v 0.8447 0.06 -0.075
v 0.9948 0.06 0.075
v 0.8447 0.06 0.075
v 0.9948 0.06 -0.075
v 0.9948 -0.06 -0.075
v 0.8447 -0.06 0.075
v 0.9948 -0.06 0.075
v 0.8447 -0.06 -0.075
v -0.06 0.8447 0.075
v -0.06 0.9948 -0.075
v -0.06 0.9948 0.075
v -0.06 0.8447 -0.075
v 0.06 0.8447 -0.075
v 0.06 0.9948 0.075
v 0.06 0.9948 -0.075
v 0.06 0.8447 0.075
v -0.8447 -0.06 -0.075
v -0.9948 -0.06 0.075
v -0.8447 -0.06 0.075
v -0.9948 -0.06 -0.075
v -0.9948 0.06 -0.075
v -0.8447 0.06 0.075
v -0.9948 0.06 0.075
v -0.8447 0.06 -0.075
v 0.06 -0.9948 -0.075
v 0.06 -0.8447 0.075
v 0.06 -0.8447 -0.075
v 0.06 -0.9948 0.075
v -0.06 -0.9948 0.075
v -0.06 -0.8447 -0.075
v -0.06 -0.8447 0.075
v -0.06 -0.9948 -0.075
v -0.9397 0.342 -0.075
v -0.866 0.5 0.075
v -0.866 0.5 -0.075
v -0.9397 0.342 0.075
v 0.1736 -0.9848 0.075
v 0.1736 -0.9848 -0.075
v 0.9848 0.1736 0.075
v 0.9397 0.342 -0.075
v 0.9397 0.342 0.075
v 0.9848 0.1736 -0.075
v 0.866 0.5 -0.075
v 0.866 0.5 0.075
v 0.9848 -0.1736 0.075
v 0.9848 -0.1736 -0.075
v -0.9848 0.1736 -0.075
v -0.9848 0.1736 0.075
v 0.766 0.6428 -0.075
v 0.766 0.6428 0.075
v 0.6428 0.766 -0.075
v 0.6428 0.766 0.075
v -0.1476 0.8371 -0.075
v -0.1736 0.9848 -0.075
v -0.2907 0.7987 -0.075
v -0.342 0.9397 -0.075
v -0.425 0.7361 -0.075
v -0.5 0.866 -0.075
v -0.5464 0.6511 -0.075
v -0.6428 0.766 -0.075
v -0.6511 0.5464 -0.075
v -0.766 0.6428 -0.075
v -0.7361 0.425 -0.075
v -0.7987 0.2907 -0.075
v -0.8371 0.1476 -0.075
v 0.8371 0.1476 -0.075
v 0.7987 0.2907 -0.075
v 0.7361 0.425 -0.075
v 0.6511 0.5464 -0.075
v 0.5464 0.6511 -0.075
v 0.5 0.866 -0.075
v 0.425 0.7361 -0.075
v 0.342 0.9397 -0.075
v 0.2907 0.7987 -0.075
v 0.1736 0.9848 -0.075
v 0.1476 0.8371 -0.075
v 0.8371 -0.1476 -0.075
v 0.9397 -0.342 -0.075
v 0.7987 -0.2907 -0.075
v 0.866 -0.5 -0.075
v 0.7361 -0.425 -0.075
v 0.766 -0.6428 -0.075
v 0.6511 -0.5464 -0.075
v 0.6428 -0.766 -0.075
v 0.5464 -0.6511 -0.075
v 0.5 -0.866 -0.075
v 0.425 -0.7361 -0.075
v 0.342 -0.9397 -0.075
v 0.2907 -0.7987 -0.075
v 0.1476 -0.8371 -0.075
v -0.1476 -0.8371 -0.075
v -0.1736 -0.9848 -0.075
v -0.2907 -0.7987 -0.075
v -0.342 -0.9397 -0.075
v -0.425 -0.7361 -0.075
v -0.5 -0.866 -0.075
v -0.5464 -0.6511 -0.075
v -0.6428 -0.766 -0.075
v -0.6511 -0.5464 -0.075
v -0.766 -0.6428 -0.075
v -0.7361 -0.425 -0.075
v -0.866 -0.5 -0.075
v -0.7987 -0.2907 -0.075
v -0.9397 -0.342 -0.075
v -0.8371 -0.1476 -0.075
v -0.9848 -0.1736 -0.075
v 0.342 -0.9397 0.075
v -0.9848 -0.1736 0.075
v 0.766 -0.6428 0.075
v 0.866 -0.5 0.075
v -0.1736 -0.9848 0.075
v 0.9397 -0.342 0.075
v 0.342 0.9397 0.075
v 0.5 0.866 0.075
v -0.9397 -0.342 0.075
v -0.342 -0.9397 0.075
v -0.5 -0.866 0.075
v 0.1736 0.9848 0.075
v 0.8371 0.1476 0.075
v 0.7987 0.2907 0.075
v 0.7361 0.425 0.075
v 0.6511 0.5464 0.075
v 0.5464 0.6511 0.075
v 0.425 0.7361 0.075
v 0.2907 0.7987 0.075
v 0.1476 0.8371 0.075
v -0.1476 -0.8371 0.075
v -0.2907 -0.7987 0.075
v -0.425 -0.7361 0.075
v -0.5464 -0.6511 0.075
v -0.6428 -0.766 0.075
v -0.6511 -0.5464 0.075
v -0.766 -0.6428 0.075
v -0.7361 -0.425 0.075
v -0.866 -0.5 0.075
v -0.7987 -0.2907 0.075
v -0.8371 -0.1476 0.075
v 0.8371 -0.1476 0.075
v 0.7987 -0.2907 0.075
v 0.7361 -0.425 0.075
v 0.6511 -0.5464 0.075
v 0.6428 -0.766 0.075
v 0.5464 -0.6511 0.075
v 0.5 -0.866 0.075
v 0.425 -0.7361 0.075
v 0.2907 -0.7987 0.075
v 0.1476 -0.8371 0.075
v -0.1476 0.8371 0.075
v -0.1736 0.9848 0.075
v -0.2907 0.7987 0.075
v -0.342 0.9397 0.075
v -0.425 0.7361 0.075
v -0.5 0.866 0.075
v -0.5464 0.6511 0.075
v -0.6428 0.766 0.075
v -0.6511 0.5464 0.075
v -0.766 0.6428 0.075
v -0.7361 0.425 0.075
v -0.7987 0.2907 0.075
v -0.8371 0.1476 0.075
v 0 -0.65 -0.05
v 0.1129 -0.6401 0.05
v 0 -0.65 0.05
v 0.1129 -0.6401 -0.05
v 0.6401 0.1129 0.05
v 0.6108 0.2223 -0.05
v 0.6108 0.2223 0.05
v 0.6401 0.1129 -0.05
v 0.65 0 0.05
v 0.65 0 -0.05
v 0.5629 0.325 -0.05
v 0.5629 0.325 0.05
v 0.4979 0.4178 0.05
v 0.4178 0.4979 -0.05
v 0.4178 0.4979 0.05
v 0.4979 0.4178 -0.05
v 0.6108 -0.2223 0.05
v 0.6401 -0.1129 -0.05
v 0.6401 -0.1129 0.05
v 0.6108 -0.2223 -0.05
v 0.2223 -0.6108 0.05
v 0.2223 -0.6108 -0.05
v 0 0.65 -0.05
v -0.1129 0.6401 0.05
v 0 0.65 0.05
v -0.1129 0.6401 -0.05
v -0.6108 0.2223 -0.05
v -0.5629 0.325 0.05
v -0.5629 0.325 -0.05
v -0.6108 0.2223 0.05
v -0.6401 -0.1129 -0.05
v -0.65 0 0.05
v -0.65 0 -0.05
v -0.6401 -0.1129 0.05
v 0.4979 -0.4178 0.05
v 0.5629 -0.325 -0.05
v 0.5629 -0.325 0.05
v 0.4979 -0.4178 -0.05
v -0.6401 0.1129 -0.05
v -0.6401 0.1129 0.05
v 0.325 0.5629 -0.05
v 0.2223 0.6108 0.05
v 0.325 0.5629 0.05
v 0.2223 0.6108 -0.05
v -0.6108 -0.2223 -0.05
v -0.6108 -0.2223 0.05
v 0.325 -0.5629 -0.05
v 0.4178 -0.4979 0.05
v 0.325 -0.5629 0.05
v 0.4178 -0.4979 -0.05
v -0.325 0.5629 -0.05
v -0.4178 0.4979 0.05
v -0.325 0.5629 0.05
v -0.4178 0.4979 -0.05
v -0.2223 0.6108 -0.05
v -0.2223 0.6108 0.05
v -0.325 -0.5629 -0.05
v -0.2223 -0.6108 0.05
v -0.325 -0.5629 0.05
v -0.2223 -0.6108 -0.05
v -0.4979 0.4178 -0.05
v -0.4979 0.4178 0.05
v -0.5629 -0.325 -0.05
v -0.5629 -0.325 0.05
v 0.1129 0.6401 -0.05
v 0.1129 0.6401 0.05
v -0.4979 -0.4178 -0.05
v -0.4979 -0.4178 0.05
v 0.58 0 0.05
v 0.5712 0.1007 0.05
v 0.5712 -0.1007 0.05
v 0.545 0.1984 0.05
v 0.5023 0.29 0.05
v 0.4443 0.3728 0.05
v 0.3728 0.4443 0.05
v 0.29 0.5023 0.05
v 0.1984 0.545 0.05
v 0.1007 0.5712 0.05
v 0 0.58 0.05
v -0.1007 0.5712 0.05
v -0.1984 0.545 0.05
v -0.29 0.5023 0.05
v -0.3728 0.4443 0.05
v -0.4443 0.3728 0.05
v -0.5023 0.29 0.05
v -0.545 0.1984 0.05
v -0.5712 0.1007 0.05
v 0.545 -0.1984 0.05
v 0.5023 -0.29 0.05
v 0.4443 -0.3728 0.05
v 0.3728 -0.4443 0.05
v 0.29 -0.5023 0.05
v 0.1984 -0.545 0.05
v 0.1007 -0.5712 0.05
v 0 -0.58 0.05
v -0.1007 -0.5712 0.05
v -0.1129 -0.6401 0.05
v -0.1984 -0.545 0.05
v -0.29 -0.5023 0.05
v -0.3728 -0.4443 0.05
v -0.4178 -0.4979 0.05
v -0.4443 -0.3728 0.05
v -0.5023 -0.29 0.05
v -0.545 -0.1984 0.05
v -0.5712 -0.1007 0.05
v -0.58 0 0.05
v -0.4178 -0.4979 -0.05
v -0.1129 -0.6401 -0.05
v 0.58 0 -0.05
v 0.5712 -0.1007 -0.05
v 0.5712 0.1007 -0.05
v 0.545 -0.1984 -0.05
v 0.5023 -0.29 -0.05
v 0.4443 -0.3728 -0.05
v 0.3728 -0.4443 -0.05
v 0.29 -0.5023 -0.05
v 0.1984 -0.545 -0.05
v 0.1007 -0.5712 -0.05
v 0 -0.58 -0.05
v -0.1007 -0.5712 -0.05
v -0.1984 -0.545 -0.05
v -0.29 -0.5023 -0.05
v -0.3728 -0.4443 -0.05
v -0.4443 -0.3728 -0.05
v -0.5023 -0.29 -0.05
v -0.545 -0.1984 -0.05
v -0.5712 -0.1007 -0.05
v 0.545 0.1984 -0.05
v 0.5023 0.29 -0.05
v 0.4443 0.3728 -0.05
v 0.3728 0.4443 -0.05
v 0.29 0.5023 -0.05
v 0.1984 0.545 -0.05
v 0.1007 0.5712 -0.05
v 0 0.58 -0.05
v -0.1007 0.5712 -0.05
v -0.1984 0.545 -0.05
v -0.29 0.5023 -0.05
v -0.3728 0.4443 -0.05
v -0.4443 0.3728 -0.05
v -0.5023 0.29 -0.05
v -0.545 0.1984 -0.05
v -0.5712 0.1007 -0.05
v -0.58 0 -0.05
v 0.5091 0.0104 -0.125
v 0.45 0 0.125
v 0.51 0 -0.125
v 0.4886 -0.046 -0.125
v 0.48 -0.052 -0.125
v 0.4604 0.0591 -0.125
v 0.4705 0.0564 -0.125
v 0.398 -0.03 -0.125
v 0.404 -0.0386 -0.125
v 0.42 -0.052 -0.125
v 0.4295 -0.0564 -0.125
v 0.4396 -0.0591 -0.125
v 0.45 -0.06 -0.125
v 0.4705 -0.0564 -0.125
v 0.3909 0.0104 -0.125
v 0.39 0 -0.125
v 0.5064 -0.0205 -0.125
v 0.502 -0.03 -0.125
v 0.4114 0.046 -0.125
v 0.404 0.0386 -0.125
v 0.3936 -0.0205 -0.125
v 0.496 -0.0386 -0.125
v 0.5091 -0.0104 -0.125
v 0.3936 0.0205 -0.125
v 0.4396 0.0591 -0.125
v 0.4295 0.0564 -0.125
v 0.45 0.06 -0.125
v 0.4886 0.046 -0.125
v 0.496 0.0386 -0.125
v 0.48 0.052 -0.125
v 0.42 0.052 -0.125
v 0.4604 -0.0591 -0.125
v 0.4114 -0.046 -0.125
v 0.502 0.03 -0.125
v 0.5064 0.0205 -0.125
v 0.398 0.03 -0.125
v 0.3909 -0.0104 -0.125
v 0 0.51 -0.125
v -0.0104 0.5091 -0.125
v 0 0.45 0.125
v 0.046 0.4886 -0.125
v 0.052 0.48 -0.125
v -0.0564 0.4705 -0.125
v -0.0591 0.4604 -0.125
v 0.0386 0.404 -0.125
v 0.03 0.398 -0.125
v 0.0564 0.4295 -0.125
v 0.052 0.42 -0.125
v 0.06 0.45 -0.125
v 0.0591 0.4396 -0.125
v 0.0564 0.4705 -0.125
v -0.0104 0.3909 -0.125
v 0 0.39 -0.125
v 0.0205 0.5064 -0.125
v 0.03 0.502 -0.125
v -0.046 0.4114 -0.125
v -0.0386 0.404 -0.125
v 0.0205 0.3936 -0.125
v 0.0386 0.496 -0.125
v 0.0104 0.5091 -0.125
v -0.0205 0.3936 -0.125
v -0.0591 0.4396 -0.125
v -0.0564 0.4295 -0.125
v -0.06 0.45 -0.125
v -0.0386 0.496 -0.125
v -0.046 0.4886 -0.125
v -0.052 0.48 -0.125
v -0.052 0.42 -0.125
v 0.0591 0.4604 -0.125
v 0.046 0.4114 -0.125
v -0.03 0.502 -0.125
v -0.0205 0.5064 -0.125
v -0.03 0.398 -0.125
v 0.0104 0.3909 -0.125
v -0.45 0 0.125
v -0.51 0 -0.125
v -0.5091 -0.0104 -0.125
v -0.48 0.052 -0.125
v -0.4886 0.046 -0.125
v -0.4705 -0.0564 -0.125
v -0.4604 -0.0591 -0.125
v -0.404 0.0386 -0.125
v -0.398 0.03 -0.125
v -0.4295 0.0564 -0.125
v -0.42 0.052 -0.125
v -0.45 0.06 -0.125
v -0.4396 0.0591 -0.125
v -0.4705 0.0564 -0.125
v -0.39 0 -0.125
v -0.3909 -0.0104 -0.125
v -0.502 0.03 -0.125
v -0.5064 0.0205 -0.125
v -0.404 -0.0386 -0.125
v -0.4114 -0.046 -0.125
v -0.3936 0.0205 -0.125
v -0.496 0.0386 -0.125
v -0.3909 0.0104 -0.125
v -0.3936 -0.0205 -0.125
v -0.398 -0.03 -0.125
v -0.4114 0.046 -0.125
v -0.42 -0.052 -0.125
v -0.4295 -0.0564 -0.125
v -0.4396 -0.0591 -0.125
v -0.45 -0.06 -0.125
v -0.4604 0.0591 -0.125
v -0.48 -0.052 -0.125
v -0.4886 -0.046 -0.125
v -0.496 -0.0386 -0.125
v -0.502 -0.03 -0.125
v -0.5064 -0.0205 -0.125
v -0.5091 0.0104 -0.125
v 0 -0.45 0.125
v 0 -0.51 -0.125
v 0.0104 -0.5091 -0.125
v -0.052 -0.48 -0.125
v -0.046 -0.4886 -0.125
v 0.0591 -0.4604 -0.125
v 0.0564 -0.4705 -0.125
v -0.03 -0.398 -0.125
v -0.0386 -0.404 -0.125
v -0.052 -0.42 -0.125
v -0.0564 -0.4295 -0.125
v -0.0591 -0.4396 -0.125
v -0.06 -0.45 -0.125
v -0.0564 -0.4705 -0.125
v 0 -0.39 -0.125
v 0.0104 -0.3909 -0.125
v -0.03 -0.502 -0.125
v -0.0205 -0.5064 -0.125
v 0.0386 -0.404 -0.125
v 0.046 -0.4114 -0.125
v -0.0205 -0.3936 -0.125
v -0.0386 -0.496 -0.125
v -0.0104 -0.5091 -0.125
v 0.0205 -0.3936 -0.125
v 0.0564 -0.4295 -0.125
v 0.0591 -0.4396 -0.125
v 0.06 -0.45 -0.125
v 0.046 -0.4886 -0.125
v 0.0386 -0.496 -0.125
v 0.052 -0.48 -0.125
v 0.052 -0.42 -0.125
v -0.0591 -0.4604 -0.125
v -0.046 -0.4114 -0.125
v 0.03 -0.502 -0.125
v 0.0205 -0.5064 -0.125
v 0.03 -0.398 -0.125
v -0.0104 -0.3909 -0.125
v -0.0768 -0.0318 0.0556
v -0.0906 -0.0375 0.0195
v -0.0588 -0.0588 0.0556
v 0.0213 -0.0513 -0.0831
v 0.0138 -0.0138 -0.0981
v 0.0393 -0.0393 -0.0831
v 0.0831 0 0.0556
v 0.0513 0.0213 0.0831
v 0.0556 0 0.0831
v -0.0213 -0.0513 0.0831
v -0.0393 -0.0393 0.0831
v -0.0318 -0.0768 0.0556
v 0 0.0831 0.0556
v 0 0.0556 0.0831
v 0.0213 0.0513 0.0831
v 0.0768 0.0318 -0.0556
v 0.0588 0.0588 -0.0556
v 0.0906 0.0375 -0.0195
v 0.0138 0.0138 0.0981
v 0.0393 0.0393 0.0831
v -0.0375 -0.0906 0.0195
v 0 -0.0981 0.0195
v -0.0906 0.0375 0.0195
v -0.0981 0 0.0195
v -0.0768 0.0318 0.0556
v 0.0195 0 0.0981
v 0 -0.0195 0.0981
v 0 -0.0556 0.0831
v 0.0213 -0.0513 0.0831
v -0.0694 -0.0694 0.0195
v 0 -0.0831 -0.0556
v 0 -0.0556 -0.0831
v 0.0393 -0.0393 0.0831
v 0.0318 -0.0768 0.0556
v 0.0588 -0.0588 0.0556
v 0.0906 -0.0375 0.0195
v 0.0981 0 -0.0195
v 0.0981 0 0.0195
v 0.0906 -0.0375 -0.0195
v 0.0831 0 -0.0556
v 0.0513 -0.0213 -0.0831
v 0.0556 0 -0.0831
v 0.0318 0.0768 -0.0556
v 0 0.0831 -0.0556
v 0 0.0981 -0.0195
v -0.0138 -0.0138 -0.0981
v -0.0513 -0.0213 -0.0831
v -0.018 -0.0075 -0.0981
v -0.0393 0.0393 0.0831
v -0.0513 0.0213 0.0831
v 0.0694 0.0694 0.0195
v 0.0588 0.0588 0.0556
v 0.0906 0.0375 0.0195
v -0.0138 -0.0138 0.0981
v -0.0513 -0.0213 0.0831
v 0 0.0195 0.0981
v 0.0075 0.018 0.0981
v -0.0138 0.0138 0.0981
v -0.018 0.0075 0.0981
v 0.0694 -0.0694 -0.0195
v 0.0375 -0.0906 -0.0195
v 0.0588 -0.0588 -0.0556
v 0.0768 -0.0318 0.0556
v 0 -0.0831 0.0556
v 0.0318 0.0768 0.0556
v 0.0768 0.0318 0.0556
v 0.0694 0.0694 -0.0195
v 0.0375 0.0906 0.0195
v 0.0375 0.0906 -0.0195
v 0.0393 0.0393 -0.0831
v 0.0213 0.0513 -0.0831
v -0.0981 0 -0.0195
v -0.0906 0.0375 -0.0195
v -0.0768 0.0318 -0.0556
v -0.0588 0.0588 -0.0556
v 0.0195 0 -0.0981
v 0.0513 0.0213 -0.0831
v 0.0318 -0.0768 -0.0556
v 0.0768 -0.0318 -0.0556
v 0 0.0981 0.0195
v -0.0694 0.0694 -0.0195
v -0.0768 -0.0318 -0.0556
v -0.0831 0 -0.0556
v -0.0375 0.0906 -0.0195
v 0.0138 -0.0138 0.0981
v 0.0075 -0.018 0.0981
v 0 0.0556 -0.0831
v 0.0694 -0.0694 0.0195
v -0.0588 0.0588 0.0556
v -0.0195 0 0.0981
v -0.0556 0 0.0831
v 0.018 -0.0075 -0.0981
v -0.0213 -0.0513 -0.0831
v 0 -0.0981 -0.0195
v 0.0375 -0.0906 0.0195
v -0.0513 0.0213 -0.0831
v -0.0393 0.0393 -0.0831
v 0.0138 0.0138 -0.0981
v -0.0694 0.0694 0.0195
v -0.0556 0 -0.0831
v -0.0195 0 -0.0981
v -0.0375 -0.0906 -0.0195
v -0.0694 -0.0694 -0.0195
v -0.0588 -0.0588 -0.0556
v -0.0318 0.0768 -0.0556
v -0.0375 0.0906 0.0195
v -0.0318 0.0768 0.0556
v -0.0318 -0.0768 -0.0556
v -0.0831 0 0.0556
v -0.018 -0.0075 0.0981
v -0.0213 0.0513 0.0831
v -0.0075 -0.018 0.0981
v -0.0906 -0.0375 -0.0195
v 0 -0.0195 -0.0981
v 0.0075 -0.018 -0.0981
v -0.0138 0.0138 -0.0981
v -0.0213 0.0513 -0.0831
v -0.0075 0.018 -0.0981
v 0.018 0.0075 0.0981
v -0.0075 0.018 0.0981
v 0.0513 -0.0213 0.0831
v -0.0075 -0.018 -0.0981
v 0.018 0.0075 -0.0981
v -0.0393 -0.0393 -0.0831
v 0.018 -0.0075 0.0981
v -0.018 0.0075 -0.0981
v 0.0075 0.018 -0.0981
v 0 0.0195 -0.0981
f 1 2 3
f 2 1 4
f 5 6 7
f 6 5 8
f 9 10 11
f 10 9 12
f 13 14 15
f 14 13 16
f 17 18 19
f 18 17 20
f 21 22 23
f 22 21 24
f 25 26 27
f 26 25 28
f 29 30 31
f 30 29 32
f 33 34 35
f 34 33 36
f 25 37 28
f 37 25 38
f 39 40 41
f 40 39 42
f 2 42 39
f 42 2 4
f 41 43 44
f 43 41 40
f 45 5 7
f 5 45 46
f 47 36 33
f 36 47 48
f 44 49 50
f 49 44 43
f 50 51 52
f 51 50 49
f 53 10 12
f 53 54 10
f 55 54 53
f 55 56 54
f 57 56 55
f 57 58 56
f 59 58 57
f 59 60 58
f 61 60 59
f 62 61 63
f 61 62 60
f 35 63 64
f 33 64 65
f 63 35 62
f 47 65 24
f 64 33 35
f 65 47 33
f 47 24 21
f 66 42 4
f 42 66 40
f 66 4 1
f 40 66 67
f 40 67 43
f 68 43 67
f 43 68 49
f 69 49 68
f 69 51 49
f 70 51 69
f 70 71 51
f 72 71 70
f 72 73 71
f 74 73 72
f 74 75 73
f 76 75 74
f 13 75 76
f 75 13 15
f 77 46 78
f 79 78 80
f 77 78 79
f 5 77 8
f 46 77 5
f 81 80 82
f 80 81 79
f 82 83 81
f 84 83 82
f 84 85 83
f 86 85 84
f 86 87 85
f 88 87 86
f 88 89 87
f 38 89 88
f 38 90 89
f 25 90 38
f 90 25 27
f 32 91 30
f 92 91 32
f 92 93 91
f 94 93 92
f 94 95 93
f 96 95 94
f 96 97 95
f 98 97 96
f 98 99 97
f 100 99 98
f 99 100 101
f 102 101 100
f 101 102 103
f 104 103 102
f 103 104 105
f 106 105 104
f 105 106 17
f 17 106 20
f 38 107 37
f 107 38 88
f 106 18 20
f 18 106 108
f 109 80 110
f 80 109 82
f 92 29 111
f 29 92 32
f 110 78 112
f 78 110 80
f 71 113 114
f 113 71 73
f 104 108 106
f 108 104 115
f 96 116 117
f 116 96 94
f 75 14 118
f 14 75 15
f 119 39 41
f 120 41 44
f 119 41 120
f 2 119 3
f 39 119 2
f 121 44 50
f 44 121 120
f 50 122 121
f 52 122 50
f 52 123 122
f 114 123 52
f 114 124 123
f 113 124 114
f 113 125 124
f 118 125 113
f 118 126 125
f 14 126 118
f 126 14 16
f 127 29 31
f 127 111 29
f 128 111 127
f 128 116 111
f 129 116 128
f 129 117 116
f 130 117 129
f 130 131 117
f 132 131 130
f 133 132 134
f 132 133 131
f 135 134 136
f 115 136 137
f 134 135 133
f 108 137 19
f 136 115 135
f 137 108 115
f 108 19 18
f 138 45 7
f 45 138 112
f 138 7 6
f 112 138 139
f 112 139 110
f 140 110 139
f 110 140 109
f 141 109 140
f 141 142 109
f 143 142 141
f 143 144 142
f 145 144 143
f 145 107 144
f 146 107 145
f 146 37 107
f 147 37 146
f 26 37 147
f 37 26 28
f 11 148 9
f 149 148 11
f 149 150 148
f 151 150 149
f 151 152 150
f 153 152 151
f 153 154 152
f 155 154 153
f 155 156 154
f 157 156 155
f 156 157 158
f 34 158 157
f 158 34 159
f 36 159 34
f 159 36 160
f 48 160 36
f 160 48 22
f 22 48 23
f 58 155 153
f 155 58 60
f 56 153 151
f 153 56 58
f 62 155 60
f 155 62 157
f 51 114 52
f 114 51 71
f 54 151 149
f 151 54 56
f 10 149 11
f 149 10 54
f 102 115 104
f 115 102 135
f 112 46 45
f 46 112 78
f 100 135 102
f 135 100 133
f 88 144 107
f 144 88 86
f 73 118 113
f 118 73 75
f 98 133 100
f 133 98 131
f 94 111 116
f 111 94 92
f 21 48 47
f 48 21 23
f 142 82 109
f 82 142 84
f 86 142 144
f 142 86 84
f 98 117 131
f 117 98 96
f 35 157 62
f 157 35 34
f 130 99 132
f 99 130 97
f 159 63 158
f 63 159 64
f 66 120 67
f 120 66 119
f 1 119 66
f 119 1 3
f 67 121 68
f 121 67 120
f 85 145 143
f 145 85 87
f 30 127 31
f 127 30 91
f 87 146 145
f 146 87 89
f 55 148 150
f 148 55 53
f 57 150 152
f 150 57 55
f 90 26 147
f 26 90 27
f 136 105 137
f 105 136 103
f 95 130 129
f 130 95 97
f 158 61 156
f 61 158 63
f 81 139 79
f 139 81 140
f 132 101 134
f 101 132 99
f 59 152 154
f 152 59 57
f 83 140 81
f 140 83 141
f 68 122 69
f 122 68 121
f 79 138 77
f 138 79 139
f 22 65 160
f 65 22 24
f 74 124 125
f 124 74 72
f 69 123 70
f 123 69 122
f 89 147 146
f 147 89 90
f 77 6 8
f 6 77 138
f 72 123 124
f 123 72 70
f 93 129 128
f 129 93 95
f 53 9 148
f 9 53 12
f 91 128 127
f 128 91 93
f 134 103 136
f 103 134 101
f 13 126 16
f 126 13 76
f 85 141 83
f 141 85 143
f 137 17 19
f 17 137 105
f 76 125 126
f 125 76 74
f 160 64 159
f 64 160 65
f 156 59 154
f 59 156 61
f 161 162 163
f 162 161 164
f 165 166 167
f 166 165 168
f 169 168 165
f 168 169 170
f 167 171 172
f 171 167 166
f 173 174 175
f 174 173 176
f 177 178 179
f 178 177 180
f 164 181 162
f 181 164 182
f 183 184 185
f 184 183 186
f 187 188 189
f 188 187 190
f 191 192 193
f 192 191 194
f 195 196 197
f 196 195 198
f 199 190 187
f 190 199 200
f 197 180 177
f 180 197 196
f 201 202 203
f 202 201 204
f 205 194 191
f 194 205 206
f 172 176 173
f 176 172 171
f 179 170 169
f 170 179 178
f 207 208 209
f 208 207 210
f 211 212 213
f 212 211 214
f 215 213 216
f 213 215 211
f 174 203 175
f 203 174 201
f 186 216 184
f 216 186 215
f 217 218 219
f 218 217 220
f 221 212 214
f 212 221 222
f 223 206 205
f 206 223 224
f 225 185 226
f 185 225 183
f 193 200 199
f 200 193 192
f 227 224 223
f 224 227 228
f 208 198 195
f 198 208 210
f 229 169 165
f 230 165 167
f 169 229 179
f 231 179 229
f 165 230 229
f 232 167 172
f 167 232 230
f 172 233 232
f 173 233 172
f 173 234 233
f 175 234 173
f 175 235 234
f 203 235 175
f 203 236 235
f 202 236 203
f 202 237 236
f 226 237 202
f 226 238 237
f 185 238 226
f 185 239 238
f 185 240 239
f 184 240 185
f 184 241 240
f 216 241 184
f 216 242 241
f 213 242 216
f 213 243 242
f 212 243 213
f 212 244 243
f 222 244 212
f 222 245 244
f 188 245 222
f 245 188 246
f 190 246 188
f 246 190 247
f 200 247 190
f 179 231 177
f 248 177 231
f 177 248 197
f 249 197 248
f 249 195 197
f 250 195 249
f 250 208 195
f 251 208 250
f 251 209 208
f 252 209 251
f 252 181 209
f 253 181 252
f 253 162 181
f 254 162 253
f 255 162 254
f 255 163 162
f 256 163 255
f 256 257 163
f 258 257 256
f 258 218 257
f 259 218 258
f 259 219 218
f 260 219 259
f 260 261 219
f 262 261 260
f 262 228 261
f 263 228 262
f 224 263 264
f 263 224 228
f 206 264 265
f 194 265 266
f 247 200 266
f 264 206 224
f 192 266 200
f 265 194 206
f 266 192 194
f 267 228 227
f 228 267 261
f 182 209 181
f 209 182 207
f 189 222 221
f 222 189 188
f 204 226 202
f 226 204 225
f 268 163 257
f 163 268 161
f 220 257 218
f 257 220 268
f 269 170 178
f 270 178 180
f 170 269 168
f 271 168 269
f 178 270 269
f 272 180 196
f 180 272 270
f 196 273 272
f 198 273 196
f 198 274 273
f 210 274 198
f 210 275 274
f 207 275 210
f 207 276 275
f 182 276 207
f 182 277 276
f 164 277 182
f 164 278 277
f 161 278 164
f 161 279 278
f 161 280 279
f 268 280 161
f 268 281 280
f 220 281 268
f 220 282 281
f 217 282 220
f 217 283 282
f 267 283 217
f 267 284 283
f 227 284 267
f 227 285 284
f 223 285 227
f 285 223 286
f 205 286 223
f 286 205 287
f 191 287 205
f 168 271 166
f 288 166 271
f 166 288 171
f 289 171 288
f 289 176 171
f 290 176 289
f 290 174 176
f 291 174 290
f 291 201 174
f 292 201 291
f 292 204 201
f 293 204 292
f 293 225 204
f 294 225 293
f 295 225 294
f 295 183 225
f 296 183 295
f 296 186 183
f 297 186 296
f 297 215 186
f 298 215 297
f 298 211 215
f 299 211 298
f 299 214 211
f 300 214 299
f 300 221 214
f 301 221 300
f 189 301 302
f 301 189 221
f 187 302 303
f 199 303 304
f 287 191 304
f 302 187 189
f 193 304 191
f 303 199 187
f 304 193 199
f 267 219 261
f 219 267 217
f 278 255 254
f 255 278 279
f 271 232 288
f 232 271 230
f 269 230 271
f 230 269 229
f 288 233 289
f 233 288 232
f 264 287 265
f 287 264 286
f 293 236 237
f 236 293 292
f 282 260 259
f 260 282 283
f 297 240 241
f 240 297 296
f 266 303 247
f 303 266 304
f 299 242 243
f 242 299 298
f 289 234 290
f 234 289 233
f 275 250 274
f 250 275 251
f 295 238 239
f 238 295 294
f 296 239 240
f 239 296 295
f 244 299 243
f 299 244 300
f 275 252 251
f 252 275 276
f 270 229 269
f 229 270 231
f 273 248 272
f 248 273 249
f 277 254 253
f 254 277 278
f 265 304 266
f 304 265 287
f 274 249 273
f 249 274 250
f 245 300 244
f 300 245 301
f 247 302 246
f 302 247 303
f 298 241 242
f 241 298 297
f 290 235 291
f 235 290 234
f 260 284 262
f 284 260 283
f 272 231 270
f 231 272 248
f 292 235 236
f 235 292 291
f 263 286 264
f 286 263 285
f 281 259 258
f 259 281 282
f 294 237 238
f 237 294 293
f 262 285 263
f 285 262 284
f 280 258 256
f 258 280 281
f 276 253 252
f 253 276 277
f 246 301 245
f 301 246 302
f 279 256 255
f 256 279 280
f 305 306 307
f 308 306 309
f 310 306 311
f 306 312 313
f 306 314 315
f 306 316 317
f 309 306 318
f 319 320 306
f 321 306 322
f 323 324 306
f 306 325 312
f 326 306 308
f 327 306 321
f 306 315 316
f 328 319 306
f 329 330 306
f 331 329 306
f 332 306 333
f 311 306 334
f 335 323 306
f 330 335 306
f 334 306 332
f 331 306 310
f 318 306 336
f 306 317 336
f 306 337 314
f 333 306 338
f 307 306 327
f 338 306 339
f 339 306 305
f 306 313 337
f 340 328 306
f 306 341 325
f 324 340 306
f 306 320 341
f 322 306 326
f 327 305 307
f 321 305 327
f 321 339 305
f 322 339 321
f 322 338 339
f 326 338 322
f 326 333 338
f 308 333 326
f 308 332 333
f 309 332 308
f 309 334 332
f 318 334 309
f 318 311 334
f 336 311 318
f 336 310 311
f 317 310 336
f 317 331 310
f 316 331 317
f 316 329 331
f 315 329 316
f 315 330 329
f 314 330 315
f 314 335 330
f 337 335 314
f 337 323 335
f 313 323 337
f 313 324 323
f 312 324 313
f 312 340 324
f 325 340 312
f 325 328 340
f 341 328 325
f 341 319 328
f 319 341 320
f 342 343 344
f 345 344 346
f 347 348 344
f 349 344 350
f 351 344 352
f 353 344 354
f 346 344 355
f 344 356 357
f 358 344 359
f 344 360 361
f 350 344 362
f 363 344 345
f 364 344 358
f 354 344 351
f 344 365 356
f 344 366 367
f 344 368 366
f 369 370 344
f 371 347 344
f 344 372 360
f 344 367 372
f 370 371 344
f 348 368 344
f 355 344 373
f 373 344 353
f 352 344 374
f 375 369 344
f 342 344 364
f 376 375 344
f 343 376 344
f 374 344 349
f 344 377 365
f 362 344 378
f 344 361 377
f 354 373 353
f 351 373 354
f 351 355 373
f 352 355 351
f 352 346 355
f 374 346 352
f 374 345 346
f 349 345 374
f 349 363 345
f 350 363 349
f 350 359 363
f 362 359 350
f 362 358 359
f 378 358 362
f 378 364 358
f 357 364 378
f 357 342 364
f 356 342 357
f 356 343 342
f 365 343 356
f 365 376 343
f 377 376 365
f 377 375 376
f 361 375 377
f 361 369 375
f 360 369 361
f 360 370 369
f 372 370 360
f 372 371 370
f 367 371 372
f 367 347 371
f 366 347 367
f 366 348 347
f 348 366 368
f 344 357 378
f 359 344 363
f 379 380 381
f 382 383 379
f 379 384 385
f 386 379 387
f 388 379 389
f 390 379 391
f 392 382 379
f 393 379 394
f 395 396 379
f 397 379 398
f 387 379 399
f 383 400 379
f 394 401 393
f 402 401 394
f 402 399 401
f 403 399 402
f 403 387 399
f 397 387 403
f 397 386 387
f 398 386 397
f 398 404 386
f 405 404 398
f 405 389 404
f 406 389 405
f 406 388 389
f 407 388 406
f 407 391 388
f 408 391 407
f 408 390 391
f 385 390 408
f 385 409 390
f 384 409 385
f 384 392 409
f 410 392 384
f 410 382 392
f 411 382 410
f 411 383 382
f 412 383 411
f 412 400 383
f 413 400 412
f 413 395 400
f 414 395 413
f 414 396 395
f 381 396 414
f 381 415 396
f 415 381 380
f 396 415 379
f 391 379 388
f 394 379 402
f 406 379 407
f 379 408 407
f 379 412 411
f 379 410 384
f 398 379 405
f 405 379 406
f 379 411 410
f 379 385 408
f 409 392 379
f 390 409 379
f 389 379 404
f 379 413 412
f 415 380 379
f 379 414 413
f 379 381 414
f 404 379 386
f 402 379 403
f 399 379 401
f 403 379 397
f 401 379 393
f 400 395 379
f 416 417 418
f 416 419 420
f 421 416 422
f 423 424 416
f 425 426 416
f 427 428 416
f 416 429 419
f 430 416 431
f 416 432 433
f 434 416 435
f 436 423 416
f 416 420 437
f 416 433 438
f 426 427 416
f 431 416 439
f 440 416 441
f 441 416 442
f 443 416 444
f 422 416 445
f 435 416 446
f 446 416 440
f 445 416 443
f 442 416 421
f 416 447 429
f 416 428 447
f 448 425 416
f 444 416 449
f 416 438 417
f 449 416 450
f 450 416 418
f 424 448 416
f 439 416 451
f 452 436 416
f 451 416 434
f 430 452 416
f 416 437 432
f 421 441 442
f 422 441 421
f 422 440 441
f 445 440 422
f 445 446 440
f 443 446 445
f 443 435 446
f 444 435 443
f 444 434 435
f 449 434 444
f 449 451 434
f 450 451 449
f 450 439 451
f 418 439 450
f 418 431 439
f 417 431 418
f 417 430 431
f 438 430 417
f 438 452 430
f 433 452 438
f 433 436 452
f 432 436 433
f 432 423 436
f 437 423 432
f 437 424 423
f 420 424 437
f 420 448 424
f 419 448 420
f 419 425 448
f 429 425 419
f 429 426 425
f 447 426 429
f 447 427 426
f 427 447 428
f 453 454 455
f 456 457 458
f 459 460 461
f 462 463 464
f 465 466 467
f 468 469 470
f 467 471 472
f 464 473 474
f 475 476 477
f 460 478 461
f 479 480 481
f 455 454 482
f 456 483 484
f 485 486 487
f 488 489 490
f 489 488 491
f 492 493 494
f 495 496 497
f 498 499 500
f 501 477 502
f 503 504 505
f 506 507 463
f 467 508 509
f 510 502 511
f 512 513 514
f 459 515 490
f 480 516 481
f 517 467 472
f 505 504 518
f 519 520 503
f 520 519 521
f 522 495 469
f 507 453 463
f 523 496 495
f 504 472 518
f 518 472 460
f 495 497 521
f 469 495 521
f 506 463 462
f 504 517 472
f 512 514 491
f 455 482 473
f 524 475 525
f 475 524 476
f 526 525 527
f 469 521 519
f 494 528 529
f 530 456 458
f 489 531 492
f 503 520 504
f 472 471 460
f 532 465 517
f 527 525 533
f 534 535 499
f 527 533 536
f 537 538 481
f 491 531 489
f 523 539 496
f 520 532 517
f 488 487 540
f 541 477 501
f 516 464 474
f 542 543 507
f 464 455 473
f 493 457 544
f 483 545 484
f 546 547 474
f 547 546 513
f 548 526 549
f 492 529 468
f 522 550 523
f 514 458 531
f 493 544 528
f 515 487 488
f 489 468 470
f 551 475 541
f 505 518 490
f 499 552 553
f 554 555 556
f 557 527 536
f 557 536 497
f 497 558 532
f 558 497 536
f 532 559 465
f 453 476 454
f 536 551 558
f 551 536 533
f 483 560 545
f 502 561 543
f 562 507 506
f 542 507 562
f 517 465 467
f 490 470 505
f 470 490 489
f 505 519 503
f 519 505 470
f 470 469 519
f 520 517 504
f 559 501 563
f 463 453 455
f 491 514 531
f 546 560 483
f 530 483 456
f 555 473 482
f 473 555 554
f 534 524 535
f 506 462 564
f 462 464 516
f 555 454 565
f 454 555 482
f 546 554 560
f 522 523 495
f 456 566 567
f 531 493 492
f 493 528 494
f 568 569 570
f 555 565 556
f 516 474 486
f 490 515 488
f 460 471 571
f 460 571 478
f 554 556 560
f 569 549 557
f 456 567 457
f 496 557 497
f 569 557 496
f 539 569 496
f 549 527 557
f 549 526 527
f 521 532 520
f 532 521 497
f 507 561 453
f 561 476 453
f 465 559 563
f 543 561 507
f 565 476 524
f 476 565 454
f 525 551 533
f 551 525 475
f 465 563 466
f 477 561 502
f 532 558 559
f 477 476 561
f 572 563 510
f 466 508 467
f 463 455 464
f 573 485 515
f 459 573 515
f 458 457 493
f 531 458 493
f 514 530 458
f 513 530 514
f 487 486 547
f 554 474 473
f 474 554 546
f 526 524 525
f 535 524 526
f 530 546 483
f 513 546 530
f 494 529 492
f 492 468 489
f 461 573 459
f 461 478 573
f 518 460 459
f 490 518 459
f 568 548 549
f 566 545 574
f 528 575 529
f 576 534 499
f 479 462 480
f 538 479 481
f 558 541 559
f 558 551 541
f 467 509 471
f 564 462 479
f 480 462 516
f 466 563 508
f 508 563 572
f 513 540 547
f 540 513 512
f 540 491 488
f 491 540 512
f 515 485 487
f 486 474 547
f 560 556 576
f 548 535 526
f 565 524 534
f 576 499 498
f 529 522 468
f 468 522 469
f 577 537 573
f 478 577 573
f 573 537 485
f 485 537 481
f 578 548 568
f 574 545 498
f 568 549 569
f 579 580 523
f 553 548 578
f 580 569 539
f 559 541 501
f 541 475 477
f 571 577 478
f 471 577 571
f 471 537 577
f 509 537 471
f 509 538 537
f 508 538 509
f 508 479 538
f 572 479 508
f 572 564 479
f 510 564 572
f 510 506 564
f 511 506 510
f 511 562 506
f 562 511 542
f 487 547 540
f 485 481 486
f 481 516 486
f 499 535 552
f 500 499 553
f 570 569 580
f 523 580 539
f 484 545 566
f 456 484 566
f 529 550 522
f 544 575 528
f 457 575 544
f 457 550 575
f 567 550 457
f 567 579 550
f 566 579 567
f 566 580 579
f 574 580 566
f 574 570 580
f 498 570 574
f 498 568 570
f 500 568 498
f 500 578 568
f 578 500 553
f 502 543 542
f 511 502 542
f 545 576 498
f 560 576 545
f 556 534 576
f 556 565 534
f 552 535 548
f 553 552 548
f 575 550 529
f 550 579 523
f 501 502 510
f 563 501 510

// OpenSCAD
// cursor_reticle.scad
// 3D targeting reticle with cardinal tick pointers and center pip.
// Authored for WoWViewer in-scene 3D spatial UI.

$fn = 36;

module cursor_reticle() {
    // Center pip
    sphere(r = 0.1, $fn = 16);

    // Outer ring with cardinal notches
    difference() {
        cylinder(r = 1.0, h = 0.15, center = true);
        cylinder(r = 0.85, h = 0.25, center = true);

        // Cardinal notch cutouts
        for (a = [0, 9], a = [0, 90, 180, 270]) {
            rotate([0, 0, a])
            translate([0.92, 0, 0])
            cube([0.25, 0.12, 0.3], center = true);
        }
    }

    // Inner ring
    difference() {
        cylinder(r = 0.65, h = 0.1, center = true);
        cylinder(r = 0.58, h = 0.2, center = true);
    }

    // 4 Cardinal tick pointers pointing inward
    for (a = [0, 90, 180, 270]) {
        rotate([0, 0, a])
        translate([0.45, 0, 0])
        cylinder(r1 = 0.06, r2 = 0.0, h = 0.25, center = true);
    }
}

cursor_reticle();
